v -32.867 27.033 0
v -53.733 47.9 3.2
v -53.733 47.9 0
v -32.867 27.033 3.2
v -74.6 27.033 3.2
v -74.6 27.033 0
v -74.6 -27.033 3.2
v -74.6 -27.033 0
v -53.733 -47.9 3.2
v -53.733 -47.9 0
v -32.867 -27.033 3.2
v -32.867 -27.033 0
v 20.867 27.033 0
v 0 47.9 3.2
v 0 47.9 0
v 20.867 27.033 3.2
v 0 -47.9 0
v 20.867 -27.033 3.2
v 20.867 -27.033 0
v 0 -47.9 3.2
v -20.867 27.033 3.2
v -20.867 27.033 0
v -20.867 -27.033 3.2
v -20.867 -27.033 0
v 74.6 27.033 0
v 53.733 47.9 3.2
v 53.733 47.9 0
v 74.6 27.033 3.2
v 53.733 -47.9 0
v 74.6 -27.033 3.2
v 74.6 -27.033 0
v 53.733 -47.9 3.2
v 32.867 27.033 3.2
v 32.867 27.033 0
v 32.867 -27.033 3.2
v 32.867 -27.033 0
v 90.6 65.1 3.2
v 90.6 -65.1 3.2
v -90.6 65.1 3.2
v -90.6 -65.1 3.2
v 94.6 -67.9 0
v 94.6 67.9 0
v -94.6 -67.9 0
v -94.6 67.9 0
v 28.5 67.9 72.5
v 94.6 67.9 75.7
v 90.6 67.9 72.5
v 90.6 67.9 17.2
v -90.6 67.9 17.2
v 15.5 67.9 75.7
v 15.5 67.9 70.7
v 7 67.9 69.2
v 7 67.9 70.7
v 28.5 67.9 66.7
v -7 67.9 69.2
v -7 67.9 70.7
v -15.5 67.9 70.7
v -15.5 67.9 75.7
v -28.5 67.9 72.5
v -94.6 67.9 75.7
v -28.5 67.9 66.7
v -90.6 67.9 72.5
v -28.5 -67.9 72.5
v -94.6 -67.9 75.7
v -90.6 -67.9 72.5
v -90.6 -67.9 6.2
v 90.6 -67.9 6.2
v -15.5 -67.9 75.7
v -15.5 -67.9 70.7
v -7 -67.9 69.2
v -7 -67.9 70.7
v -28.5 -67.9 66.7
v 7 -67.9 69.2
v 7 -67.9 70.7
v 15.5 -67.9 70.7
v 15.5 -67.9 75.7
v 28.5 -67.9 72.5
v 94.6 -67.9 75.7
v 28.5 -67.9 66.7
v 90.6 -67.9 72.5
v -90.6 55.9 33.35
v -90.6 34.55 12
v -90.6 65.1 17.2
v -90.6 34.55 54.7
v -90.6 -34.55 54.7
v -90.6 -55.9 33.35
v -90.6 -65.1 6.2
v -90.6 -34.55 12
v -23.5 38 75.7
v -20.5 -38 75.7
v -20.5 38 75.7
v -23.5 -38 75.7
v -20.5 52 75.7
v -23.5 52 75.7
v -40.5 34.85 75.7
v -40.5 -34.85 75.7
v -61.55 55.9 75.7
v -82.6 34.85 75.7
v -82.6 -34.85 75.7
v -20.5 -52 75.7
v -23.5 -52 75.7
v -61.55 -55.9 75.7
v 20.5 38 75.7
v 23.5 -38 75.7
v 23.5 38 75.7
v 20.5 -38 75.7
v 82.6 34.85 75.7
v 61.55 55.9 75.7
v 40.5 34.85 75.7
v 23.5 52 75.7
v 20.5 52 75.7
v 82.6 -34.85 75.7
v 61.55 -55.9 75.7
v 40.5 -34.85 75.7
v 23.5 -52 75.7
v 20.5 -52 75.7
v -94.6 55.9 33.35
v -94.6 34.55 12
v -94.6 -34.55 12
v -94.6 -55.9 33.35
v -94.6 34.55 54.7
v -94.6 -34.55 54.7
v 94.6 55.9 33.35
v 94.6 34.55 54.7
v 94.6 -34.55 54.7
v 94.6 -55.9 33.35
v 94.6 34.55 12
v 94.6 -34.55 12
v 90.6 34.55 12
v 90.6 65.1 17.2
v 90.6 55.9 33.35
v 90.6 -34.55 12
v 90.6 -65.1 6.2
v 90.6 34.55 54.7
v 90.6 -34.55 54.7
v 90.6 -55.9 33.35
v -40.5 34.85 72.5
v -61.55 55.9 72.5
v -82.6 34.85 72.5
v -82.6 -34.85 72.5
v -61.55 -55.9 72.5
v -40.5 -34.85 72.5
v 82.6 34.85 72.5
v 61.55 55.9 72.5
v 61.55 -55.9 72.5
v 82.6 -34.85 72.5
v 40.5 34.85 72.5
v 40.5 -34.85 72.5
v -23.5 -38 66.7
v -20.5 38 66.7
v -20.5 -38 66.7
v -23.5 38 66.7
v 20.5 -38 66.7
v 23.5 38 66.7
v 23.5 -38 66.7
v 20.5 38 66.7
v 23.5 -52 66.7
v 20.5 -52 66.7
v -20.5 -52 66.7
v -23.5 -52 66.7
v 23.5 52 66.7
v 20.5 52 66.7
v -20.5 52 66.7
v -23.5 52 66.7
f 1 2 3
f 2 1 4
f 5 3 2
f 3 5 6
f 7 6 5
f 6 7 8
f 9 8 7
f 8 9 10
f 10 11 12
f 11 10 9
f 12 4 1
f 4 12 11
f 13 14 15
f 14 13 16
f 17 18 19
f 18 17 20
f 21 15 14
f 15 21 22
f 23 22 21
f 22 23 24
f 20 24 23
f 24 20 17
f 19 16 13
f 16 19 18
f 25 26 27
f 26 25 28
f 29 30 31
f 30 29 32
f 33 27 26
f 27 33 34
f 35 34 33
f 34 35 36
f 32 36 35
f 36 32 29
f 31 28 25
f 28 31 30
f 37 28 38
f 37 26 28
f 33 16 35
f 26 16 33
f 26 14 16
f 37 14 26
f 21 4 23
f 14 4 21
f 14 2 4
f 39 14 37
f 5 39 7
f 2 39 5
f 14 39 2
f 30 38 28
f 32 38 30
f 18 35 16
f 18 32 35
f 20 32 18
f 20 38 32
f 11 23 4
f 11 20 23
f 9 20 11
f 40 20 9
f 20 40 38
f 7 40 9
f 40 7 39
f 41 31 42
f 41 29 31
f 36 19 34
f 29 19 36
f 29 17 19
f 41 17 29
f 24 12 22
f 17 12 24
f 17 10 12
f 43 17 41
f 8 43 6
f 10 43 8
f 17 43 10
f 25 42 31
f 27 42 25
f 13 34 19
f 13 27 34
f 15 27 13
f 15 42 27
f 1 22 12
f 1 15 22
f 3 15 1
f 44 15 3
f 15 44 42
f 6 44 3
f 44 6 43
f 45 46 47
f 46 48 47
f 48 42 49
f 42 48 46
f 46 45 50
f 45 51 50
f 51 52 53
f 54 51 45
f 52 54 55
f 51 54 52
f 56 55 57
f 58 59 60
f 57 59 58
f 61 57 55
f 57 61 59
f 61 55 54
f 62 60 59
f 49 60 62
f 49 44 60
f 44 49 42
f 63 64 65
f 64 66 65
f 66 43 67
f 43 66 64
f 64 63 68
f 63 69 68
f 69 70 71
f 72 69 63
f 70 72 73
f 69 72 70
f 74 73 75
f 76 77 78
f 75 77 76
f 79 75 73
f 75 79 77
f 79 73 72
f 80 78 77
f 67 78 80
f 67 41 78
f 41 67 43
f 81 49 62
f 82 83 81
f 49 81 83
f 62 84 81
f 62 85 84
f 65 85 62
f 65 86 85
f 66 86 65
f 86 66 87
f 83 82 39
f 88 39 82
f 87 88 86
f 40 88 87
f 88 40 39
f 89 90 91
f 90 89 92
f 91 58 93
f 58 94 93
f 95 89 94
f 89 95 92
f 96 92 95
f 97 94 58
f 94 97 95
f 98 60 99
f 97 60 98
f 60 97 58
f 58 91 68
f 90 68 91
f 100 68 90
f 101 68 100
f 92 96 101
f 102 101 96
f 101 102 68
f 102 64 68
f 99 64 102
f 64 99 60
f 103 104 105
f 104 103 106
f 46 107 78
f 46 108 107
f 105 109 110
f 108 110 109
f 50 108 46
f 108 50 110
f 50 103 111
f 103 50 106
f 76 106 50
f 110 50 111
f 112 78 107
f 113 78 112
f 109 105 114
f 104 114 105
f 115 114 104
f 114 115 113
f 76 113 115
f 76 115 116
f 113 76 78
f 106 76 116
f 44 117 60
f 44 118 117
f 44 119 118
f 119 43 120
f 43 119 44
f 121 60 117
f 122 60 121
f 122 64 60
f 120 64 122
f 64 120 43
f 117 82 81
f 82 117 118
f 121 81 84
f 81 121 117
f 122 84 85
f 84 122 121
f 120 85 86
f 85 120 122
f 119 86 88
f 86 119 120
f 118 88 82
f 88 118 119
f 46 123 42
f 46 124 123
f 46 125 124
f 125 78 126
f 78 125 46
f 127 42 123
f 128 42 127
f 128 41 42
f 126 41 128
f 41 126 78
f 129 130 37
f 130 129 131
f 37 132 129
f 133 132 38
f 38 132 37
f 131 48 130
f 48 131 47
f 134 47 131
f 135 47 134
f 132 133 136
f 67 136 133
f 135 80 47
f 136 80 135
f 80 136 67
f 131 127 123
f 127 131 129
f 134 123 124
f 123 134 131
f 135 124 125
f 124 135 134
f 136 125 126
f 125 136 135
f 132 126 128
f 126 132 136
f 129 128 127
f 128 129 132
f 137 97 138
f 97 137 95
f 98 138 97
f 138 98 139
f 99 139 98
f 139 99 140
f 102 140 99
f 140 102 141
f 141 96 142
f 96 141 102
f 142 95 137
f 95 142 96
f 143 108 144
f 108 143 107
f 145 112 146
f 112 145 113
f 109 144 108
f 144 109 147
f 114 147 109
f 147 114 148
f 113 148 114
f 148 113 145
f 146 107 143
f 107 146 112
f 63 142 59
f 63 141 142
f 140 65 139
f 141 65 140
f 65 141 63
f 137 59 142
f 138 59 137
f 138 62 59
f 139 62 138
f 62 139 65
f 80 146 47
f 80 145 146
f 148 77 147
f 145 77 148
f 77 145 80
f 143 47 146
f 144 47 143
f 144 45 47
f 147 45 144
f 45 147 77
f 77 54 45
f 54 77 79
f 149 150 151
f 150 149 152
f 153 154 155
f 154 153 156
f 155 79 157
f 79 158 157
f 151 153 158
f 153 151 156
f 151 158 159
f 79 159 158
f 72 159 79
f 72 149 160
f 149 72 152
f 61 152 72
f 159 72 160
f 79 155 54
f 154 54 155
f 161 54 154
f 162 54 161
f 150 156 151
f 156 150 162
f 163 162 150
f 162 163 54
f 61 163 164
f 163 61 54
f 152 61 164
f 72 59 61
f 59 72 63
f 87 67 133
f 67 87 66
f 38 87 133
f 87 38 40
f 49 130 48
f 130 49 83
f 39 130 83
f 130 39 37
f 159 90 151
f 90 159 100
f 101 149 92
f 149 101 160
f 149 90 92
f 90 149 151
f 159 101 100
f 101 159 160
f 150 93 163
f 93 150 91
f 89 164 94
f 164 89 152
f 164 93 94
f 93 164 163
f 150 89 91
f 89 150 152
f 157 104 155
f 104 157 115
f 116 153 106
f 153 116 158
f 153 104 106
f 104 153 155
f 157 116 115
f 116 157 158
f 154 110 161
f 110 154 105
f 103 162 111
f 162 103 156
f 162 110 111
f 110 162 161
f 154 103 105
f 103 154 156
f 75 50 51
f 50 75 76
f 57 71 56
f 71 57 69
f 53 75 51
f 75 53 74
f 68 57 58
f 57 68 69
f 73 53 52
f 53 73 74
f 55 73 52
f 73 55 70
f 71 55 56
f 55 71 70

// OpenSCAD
// Under-keyboard mount for a Focusrite Scarlett 4i4 4th gen, hung from one of
// the front-to-back top support arms of a Z-type keyboard stand (Donner, 60-85 cm).
//
// Orientation: the bar runs FRONT TO BACK, i.e. along this model's Y axis, which
// is also the unit's depth axis. So the unit's front panel faces the player,
// parallel to the bar. The keyboard lies across the two arms, above.
//
// How it mounts: the thickened band down the centre of the ceiling beds against
// the UNDERSIDE of the bar, and two straps (zip ties or hook-and-loop) pass up
// through the four slots and around the bar. Nothing sits on top of the bar
// except the strap, so the keyboard still rests on the bar and is lifted only by
// the strap thickness. A groove along the ceiling locates the bar sideways and
// takes a rubber strip - see the note on groove_depth.
//
// The unit slides in from the FRONT, tilted over the front lip, and is stopped by
// the rear stop. Front and rear are open so the front-panel jacks and the rear
// USB-C / line outs stay reachable. The top panel is NOT reachable once mounted -
// that is inherent to putting the unit under a keyboard.
//
// The ceiling is a full plate rather than a bar-width band: with the bar running
// along Y, the band alone would only reach the front lip and rear stop, so the
// shell has to hang off a plate that reaches the side walls. It is thin away from
// the band and windowed to keep the mass down.
//
// Print orientation: standing on the REAR face (the +Y face), i.e. rotate 90 deg
// about X in the slicer, or set orient_for_print = true to export it already
// rotated. The part is then a rectangular tube standing on a closed perimeter
// ring: every wall vertical, the load path inside the layers, good bed adhesion.
//
// That makes the build direction -Y, so each layer is one cross-section through
// the depth of the box. Every lightening window therefore has an end that CLOSES
// in the build direction, and a square-ended window would have to be bridged
// there. So all the windows have 45 degree ends (window_2d) and the floor window
// is split into three, keeping every closing edge self-supporting.
// No supports needed. Longest unsupported span is 3 mm: the strap slots where they
// close, and the step where the front lip stands proud of the floor.

/* [Audio interface] */
// Focusrite Scarlett 4i4 4th gen, published spec - confirm with calipers
device_width  = 180;  // placeholder
device_depth  = 129;  // placeholder
device_height = 59;   // placeholder
// total slack across each cavity dimension; larger than the profile's
// fit_clearance because this is a drop-in cradle, not a press fit
device_fit    = 1.2;

/* [Stand bar] */
bar_width     = 30;   // measured - the arm's horizontal width
bar_play       = 1.0; // slack in the locating groove
// Depth costs nothing in drop below the arm: the arm sits down inside the groove,
// so only the material UNDER the groove adds height. Made generous instead, which
// improves sideways location and resistance to tipping, and leaves room for the
// rubber strip that resists fore-and-aft creep. See the note at the foot of the
// file for why that strip matters.
groove_depth  = 5.0;

// The arm's underside has a hook socket with a ~1 mm raised rim round it. Rather
// than positioning the mount to dodge it, the groove floor carries a relief
// channel down its centre, so the arm beds on two shoulders either side and any
// such feature has somewhere to go wherever it happens to sit along the arm.
relief_width  = 14;
relief_depth  = 1.5;
band_offset_x = 0;    // shift the band if the bar is not centred under the unit

/* [Straps] */
strap_slot_width     = 14;  // along the bar; fits a 12 mm strap or a heavy zip tie
strap_slot_thickness = 3;
strap_spacing_y      = 90;  // centre-to-centre of the two strap loops, along the bar
strap_wall           = 5;   // material each side of a slot; it carries the load

/* [Shell] */
side_wall         = 4;
floor_thickness   = 3.2;
lip_wall          = 2.8;
ceiling_thickness = 9;    // the band under the groove
ceiling_skin      = 3.2;  // the rest of the ceiling plate
device_clearance  = 4.5;  // headroom, enough to tilt the unit in over the front lip
front_lip_height  = 3;
rear_stop_height  = 14;

/* [Lightening windows] */
floor_rim     = 20;
side_rim      = 12;
ceiling_rim   = 12;
// The floor window is split so each piece is narrow enough for its 45 degree end
// to close within the window's own length. One wide window cannot: closing 149 mm
// at 45 degrees would need 75 mm of run and only 96 mm of length exists.
floor_windows = 3;
floor_rib     = 12;
// Multiplier on the 45 degree end taper. 1.0 gives exactly 45 degrees, the usual
// self-supporting limit; raise it if the first print shows the ends drooping.
window_taper  = 1.0;

/* [Output] */
orient_for_print = false;

/* [Hidden] */
$fn = 48;
eps = 0.01;

// --- derived -----------------------------------------------------------------
cav_x   = device_width + device_fit;
cav_y   = device_depth + device_fit;
outer_x = cav_x + 2 * side_wall;
outer_y = cav_y + 2 * lip_wall;

// Z datum: 0 is the top face of the ceiling, which beds against the bar.
ceiling_bottom_z = -ceiling_thickness;
device_top_z     = ceiling_bottom_z - device_clearance;
device_bottom_z  = device_top_z - device_height;
floor_top_z      = device_bottom_z;
floor_bottom_z   = floor_top_z - floor_thickness;

groove_x   = bar_width + bar_play;
slot_mid_x = groove_x / 2 + strap_wall + strap_slot_thickness / 2;
band_x     = groove_x + 2 * (strap_wall + strap_slot_thickness + strap_wall);

echo(min_wall = min(side_wall, floor_thickness, lip_wall, strap_wall, ceiling_skin,
                    ceiling_thickness - groove_depth - relief_depth));
echo(overall = [outer_x, outer_y, -floor_bottom_z]);
// What actually matters on this stand: how far the mount reaches below the arm's
// underside, since the angled upright closes in as you go down.
echo(drop_below_arm = -floor_bottom_z - groove_depth);

// Window outline with 45 degree ends along Y. w is the width across the plate,
// l the length along Y. Because Y is the build direction, those ends close one
// layer-width at a time instead of needing a bridge.
module window_2d(w, l) {
    h   = w / 2;
    run = h * window_taper;
    assert(l > 2 * run,
           "window too short along Y for its taper - narrow it, split it, or lower window_taper");
    polygon([[-h, -(l / 2 - run)], [0, -l / 2], [h, -(l / 2 - run)],
             [h,    l / 2 - run],  [0,  l / 2], [-h,   l / 2 - run]]);
}

module floor_plate() {
    span = outer_x - 2 * floor_rim;
    w    = (span - (floor_windows - 1) * floor_rib) / floor_windows;
    l    = outer_y - 2 * floor_rim;
    difference() {
        translate([-outer_x / 2, -outer_y / 2, floor_bottom_z])
            cube([outer_x, outer_y, floor_thickness]);
        for (i = [0 : floor_windows - 1])
            translate([-span / 2 + w / 2 + i * (w + floor_rib), 0,
                       floor_bottom_z - eps])
                linear_extrude(floor_thickness + 2 * eps) window_2d(w, l);
    }
}

module side_wall_plate() {
    z_top = ceiling_bottom_z - side_rim;
    z_bot = floor_bottom_z + side_rim;
    difference() {
        translate([-side_wall / 2, -outer_y / 2, floor_bottom_z])
            cube([side_wall, outer_y, -floor_bottom_z]);
        translate([-side_wall / 2 - eps, 0, (z_top + z_bot) / 2])
            rotate([0, 90, 0])
                linear_extrude(side_wall + 2 * eps)
                    window_2d(z_top - z_bot, outer_y - 2 * side_rim);
    }
}

module side_walls() {
    for (s = [-1, 1])
        translate([s * (cav_x / 2 + side_wall / 2), 0, 0])
            side_wall_plate();
}

// Thin plate over the whole footprint, thickened to a band down the centre where
// the bar sits. One window each side of the band; the band itself stays solid
// because the load runs from the straps out to the side walls through it.
module ceiling() {
    // One window between each side of the band and the outer rim, sized per side
    // so band_offset_x stays usable.
    left  = [-outer_x / 2 + ceiling_rim,
             band_offset_x - band_x / 2 - ceiling_rim];
    right = [band_offset_x + band_x / 2 + ceiling_rim,
             outer_x / 2 - ceiling_rim];
    l = outer_y - 2 * ceiling_rim;
    union() {
        difference() {
            translate([-outer_x / 2, -outer_y / 2, -ceiling_skin])
                cube([outer_x, outer_y, ceiling_skin]);
            for (win = [left, right])
                translate([(win[0] + win[1]) / 2, 0, -ceiling_skin - eps])
                    linear_extrude(ceiling_skin + 2 * eps)
                        window_2d(win[1] - win[0], l);
        }
        translate([band_offset_x - band_x / 2, -outer_y / 2, ceiling_bottom_z])
            cube([band_x, outer_y, ceiling_thickness]);
    }
}

module front_lip() {
    translate([-outer_x / 2, -outer_y / 2, floor_bottom_z])
        cube([outer_x, lip_wall, floor_thickness + front_lip_height]);
}

module rear_stop() {
    translate([-outer_x / 2, cav_y / 2, floor_bottom_z])
        cube([outer_x, lip_wall, floor_thickness + rear_stop_height]);
}

// The recess the bar sits in, running the full length of the part along Y.
module bar_groove() {
    translate([band_offset_x - groove_x / 2, -outer_y / 2 - eps, -groove_depth])
        cube([groove_x, outer_y + 2 * eps, groove_depth + device_clearance]);
}

// Relief down the centre of the groove floor, clearing the hook socket's rim.
module underside_relief() {
    translate([band_offset_x - relief_width / 2, -outer_y / 2 - eps,
               -(groove_depth + relief_depth)])
        cube([relief_width, outer_y + 2 * eps, relief_depth + eps]);
}

module strap_slots() {
    for (sx = [-1, 1], sy = [-1, 1])
        translate([band_offset_x + sx * slot_mid_x - strap_slot_thickness / 2,
                   sy * strap_spacing_y / 2 - strap_slot_width / 2,
                   ceiling_bottom_z - eps])
            cube([strap_slot_thickness, strap_slot_width,
                  ceiling_thickness + 2 * eps]);
}

module body() {
    difference() {
        union() {
            floor_plate();
            side_walls();
            ceiling();
            front_lip();
            rear_stop();
        }
        bar_groove();
        underside_relief();
        strap_slots();
    }
}

// The internal Z datum is the bar contact plane, so body() is built entirely at
// negative Z. Both branches lift it onto Z = 0 — otherwise it sits underneath
// OpenSCAD's build platform in the GUI and renders as an empty view.
module main() {
    if (orient_for_print)
        translate([0, 0, outer_y / 2]) rotate([-90, 0, 0]) body();
    else
        translate([0, 0, -floor_bottom_z]) body();
}

main();

// Note on fore-and-aft holding force. Plugging and unplugging front-panel cables
// pushes and pulls along Y, which is now parallel to the bar, so the groove walls
// cannot bear against anything - only strap friction resists it. Bare nylon on a
// painted steel tube gives roughly 0.25 friction coefficient, so two ties at
// ~300 N total give ~75 N against a ~50 N pull: too close. Lay a 1.5 mm strip of
// rubber (a scrap of shelf liner or an old inner tube) in the groove and the
// coefficient goes to ~0.8, i.e. ~240 N. Doubling up to four ties helps too.
// The failure mode is gradual creep along the bar, not breakage - visible and
// re-tightenable rather than sudden.
